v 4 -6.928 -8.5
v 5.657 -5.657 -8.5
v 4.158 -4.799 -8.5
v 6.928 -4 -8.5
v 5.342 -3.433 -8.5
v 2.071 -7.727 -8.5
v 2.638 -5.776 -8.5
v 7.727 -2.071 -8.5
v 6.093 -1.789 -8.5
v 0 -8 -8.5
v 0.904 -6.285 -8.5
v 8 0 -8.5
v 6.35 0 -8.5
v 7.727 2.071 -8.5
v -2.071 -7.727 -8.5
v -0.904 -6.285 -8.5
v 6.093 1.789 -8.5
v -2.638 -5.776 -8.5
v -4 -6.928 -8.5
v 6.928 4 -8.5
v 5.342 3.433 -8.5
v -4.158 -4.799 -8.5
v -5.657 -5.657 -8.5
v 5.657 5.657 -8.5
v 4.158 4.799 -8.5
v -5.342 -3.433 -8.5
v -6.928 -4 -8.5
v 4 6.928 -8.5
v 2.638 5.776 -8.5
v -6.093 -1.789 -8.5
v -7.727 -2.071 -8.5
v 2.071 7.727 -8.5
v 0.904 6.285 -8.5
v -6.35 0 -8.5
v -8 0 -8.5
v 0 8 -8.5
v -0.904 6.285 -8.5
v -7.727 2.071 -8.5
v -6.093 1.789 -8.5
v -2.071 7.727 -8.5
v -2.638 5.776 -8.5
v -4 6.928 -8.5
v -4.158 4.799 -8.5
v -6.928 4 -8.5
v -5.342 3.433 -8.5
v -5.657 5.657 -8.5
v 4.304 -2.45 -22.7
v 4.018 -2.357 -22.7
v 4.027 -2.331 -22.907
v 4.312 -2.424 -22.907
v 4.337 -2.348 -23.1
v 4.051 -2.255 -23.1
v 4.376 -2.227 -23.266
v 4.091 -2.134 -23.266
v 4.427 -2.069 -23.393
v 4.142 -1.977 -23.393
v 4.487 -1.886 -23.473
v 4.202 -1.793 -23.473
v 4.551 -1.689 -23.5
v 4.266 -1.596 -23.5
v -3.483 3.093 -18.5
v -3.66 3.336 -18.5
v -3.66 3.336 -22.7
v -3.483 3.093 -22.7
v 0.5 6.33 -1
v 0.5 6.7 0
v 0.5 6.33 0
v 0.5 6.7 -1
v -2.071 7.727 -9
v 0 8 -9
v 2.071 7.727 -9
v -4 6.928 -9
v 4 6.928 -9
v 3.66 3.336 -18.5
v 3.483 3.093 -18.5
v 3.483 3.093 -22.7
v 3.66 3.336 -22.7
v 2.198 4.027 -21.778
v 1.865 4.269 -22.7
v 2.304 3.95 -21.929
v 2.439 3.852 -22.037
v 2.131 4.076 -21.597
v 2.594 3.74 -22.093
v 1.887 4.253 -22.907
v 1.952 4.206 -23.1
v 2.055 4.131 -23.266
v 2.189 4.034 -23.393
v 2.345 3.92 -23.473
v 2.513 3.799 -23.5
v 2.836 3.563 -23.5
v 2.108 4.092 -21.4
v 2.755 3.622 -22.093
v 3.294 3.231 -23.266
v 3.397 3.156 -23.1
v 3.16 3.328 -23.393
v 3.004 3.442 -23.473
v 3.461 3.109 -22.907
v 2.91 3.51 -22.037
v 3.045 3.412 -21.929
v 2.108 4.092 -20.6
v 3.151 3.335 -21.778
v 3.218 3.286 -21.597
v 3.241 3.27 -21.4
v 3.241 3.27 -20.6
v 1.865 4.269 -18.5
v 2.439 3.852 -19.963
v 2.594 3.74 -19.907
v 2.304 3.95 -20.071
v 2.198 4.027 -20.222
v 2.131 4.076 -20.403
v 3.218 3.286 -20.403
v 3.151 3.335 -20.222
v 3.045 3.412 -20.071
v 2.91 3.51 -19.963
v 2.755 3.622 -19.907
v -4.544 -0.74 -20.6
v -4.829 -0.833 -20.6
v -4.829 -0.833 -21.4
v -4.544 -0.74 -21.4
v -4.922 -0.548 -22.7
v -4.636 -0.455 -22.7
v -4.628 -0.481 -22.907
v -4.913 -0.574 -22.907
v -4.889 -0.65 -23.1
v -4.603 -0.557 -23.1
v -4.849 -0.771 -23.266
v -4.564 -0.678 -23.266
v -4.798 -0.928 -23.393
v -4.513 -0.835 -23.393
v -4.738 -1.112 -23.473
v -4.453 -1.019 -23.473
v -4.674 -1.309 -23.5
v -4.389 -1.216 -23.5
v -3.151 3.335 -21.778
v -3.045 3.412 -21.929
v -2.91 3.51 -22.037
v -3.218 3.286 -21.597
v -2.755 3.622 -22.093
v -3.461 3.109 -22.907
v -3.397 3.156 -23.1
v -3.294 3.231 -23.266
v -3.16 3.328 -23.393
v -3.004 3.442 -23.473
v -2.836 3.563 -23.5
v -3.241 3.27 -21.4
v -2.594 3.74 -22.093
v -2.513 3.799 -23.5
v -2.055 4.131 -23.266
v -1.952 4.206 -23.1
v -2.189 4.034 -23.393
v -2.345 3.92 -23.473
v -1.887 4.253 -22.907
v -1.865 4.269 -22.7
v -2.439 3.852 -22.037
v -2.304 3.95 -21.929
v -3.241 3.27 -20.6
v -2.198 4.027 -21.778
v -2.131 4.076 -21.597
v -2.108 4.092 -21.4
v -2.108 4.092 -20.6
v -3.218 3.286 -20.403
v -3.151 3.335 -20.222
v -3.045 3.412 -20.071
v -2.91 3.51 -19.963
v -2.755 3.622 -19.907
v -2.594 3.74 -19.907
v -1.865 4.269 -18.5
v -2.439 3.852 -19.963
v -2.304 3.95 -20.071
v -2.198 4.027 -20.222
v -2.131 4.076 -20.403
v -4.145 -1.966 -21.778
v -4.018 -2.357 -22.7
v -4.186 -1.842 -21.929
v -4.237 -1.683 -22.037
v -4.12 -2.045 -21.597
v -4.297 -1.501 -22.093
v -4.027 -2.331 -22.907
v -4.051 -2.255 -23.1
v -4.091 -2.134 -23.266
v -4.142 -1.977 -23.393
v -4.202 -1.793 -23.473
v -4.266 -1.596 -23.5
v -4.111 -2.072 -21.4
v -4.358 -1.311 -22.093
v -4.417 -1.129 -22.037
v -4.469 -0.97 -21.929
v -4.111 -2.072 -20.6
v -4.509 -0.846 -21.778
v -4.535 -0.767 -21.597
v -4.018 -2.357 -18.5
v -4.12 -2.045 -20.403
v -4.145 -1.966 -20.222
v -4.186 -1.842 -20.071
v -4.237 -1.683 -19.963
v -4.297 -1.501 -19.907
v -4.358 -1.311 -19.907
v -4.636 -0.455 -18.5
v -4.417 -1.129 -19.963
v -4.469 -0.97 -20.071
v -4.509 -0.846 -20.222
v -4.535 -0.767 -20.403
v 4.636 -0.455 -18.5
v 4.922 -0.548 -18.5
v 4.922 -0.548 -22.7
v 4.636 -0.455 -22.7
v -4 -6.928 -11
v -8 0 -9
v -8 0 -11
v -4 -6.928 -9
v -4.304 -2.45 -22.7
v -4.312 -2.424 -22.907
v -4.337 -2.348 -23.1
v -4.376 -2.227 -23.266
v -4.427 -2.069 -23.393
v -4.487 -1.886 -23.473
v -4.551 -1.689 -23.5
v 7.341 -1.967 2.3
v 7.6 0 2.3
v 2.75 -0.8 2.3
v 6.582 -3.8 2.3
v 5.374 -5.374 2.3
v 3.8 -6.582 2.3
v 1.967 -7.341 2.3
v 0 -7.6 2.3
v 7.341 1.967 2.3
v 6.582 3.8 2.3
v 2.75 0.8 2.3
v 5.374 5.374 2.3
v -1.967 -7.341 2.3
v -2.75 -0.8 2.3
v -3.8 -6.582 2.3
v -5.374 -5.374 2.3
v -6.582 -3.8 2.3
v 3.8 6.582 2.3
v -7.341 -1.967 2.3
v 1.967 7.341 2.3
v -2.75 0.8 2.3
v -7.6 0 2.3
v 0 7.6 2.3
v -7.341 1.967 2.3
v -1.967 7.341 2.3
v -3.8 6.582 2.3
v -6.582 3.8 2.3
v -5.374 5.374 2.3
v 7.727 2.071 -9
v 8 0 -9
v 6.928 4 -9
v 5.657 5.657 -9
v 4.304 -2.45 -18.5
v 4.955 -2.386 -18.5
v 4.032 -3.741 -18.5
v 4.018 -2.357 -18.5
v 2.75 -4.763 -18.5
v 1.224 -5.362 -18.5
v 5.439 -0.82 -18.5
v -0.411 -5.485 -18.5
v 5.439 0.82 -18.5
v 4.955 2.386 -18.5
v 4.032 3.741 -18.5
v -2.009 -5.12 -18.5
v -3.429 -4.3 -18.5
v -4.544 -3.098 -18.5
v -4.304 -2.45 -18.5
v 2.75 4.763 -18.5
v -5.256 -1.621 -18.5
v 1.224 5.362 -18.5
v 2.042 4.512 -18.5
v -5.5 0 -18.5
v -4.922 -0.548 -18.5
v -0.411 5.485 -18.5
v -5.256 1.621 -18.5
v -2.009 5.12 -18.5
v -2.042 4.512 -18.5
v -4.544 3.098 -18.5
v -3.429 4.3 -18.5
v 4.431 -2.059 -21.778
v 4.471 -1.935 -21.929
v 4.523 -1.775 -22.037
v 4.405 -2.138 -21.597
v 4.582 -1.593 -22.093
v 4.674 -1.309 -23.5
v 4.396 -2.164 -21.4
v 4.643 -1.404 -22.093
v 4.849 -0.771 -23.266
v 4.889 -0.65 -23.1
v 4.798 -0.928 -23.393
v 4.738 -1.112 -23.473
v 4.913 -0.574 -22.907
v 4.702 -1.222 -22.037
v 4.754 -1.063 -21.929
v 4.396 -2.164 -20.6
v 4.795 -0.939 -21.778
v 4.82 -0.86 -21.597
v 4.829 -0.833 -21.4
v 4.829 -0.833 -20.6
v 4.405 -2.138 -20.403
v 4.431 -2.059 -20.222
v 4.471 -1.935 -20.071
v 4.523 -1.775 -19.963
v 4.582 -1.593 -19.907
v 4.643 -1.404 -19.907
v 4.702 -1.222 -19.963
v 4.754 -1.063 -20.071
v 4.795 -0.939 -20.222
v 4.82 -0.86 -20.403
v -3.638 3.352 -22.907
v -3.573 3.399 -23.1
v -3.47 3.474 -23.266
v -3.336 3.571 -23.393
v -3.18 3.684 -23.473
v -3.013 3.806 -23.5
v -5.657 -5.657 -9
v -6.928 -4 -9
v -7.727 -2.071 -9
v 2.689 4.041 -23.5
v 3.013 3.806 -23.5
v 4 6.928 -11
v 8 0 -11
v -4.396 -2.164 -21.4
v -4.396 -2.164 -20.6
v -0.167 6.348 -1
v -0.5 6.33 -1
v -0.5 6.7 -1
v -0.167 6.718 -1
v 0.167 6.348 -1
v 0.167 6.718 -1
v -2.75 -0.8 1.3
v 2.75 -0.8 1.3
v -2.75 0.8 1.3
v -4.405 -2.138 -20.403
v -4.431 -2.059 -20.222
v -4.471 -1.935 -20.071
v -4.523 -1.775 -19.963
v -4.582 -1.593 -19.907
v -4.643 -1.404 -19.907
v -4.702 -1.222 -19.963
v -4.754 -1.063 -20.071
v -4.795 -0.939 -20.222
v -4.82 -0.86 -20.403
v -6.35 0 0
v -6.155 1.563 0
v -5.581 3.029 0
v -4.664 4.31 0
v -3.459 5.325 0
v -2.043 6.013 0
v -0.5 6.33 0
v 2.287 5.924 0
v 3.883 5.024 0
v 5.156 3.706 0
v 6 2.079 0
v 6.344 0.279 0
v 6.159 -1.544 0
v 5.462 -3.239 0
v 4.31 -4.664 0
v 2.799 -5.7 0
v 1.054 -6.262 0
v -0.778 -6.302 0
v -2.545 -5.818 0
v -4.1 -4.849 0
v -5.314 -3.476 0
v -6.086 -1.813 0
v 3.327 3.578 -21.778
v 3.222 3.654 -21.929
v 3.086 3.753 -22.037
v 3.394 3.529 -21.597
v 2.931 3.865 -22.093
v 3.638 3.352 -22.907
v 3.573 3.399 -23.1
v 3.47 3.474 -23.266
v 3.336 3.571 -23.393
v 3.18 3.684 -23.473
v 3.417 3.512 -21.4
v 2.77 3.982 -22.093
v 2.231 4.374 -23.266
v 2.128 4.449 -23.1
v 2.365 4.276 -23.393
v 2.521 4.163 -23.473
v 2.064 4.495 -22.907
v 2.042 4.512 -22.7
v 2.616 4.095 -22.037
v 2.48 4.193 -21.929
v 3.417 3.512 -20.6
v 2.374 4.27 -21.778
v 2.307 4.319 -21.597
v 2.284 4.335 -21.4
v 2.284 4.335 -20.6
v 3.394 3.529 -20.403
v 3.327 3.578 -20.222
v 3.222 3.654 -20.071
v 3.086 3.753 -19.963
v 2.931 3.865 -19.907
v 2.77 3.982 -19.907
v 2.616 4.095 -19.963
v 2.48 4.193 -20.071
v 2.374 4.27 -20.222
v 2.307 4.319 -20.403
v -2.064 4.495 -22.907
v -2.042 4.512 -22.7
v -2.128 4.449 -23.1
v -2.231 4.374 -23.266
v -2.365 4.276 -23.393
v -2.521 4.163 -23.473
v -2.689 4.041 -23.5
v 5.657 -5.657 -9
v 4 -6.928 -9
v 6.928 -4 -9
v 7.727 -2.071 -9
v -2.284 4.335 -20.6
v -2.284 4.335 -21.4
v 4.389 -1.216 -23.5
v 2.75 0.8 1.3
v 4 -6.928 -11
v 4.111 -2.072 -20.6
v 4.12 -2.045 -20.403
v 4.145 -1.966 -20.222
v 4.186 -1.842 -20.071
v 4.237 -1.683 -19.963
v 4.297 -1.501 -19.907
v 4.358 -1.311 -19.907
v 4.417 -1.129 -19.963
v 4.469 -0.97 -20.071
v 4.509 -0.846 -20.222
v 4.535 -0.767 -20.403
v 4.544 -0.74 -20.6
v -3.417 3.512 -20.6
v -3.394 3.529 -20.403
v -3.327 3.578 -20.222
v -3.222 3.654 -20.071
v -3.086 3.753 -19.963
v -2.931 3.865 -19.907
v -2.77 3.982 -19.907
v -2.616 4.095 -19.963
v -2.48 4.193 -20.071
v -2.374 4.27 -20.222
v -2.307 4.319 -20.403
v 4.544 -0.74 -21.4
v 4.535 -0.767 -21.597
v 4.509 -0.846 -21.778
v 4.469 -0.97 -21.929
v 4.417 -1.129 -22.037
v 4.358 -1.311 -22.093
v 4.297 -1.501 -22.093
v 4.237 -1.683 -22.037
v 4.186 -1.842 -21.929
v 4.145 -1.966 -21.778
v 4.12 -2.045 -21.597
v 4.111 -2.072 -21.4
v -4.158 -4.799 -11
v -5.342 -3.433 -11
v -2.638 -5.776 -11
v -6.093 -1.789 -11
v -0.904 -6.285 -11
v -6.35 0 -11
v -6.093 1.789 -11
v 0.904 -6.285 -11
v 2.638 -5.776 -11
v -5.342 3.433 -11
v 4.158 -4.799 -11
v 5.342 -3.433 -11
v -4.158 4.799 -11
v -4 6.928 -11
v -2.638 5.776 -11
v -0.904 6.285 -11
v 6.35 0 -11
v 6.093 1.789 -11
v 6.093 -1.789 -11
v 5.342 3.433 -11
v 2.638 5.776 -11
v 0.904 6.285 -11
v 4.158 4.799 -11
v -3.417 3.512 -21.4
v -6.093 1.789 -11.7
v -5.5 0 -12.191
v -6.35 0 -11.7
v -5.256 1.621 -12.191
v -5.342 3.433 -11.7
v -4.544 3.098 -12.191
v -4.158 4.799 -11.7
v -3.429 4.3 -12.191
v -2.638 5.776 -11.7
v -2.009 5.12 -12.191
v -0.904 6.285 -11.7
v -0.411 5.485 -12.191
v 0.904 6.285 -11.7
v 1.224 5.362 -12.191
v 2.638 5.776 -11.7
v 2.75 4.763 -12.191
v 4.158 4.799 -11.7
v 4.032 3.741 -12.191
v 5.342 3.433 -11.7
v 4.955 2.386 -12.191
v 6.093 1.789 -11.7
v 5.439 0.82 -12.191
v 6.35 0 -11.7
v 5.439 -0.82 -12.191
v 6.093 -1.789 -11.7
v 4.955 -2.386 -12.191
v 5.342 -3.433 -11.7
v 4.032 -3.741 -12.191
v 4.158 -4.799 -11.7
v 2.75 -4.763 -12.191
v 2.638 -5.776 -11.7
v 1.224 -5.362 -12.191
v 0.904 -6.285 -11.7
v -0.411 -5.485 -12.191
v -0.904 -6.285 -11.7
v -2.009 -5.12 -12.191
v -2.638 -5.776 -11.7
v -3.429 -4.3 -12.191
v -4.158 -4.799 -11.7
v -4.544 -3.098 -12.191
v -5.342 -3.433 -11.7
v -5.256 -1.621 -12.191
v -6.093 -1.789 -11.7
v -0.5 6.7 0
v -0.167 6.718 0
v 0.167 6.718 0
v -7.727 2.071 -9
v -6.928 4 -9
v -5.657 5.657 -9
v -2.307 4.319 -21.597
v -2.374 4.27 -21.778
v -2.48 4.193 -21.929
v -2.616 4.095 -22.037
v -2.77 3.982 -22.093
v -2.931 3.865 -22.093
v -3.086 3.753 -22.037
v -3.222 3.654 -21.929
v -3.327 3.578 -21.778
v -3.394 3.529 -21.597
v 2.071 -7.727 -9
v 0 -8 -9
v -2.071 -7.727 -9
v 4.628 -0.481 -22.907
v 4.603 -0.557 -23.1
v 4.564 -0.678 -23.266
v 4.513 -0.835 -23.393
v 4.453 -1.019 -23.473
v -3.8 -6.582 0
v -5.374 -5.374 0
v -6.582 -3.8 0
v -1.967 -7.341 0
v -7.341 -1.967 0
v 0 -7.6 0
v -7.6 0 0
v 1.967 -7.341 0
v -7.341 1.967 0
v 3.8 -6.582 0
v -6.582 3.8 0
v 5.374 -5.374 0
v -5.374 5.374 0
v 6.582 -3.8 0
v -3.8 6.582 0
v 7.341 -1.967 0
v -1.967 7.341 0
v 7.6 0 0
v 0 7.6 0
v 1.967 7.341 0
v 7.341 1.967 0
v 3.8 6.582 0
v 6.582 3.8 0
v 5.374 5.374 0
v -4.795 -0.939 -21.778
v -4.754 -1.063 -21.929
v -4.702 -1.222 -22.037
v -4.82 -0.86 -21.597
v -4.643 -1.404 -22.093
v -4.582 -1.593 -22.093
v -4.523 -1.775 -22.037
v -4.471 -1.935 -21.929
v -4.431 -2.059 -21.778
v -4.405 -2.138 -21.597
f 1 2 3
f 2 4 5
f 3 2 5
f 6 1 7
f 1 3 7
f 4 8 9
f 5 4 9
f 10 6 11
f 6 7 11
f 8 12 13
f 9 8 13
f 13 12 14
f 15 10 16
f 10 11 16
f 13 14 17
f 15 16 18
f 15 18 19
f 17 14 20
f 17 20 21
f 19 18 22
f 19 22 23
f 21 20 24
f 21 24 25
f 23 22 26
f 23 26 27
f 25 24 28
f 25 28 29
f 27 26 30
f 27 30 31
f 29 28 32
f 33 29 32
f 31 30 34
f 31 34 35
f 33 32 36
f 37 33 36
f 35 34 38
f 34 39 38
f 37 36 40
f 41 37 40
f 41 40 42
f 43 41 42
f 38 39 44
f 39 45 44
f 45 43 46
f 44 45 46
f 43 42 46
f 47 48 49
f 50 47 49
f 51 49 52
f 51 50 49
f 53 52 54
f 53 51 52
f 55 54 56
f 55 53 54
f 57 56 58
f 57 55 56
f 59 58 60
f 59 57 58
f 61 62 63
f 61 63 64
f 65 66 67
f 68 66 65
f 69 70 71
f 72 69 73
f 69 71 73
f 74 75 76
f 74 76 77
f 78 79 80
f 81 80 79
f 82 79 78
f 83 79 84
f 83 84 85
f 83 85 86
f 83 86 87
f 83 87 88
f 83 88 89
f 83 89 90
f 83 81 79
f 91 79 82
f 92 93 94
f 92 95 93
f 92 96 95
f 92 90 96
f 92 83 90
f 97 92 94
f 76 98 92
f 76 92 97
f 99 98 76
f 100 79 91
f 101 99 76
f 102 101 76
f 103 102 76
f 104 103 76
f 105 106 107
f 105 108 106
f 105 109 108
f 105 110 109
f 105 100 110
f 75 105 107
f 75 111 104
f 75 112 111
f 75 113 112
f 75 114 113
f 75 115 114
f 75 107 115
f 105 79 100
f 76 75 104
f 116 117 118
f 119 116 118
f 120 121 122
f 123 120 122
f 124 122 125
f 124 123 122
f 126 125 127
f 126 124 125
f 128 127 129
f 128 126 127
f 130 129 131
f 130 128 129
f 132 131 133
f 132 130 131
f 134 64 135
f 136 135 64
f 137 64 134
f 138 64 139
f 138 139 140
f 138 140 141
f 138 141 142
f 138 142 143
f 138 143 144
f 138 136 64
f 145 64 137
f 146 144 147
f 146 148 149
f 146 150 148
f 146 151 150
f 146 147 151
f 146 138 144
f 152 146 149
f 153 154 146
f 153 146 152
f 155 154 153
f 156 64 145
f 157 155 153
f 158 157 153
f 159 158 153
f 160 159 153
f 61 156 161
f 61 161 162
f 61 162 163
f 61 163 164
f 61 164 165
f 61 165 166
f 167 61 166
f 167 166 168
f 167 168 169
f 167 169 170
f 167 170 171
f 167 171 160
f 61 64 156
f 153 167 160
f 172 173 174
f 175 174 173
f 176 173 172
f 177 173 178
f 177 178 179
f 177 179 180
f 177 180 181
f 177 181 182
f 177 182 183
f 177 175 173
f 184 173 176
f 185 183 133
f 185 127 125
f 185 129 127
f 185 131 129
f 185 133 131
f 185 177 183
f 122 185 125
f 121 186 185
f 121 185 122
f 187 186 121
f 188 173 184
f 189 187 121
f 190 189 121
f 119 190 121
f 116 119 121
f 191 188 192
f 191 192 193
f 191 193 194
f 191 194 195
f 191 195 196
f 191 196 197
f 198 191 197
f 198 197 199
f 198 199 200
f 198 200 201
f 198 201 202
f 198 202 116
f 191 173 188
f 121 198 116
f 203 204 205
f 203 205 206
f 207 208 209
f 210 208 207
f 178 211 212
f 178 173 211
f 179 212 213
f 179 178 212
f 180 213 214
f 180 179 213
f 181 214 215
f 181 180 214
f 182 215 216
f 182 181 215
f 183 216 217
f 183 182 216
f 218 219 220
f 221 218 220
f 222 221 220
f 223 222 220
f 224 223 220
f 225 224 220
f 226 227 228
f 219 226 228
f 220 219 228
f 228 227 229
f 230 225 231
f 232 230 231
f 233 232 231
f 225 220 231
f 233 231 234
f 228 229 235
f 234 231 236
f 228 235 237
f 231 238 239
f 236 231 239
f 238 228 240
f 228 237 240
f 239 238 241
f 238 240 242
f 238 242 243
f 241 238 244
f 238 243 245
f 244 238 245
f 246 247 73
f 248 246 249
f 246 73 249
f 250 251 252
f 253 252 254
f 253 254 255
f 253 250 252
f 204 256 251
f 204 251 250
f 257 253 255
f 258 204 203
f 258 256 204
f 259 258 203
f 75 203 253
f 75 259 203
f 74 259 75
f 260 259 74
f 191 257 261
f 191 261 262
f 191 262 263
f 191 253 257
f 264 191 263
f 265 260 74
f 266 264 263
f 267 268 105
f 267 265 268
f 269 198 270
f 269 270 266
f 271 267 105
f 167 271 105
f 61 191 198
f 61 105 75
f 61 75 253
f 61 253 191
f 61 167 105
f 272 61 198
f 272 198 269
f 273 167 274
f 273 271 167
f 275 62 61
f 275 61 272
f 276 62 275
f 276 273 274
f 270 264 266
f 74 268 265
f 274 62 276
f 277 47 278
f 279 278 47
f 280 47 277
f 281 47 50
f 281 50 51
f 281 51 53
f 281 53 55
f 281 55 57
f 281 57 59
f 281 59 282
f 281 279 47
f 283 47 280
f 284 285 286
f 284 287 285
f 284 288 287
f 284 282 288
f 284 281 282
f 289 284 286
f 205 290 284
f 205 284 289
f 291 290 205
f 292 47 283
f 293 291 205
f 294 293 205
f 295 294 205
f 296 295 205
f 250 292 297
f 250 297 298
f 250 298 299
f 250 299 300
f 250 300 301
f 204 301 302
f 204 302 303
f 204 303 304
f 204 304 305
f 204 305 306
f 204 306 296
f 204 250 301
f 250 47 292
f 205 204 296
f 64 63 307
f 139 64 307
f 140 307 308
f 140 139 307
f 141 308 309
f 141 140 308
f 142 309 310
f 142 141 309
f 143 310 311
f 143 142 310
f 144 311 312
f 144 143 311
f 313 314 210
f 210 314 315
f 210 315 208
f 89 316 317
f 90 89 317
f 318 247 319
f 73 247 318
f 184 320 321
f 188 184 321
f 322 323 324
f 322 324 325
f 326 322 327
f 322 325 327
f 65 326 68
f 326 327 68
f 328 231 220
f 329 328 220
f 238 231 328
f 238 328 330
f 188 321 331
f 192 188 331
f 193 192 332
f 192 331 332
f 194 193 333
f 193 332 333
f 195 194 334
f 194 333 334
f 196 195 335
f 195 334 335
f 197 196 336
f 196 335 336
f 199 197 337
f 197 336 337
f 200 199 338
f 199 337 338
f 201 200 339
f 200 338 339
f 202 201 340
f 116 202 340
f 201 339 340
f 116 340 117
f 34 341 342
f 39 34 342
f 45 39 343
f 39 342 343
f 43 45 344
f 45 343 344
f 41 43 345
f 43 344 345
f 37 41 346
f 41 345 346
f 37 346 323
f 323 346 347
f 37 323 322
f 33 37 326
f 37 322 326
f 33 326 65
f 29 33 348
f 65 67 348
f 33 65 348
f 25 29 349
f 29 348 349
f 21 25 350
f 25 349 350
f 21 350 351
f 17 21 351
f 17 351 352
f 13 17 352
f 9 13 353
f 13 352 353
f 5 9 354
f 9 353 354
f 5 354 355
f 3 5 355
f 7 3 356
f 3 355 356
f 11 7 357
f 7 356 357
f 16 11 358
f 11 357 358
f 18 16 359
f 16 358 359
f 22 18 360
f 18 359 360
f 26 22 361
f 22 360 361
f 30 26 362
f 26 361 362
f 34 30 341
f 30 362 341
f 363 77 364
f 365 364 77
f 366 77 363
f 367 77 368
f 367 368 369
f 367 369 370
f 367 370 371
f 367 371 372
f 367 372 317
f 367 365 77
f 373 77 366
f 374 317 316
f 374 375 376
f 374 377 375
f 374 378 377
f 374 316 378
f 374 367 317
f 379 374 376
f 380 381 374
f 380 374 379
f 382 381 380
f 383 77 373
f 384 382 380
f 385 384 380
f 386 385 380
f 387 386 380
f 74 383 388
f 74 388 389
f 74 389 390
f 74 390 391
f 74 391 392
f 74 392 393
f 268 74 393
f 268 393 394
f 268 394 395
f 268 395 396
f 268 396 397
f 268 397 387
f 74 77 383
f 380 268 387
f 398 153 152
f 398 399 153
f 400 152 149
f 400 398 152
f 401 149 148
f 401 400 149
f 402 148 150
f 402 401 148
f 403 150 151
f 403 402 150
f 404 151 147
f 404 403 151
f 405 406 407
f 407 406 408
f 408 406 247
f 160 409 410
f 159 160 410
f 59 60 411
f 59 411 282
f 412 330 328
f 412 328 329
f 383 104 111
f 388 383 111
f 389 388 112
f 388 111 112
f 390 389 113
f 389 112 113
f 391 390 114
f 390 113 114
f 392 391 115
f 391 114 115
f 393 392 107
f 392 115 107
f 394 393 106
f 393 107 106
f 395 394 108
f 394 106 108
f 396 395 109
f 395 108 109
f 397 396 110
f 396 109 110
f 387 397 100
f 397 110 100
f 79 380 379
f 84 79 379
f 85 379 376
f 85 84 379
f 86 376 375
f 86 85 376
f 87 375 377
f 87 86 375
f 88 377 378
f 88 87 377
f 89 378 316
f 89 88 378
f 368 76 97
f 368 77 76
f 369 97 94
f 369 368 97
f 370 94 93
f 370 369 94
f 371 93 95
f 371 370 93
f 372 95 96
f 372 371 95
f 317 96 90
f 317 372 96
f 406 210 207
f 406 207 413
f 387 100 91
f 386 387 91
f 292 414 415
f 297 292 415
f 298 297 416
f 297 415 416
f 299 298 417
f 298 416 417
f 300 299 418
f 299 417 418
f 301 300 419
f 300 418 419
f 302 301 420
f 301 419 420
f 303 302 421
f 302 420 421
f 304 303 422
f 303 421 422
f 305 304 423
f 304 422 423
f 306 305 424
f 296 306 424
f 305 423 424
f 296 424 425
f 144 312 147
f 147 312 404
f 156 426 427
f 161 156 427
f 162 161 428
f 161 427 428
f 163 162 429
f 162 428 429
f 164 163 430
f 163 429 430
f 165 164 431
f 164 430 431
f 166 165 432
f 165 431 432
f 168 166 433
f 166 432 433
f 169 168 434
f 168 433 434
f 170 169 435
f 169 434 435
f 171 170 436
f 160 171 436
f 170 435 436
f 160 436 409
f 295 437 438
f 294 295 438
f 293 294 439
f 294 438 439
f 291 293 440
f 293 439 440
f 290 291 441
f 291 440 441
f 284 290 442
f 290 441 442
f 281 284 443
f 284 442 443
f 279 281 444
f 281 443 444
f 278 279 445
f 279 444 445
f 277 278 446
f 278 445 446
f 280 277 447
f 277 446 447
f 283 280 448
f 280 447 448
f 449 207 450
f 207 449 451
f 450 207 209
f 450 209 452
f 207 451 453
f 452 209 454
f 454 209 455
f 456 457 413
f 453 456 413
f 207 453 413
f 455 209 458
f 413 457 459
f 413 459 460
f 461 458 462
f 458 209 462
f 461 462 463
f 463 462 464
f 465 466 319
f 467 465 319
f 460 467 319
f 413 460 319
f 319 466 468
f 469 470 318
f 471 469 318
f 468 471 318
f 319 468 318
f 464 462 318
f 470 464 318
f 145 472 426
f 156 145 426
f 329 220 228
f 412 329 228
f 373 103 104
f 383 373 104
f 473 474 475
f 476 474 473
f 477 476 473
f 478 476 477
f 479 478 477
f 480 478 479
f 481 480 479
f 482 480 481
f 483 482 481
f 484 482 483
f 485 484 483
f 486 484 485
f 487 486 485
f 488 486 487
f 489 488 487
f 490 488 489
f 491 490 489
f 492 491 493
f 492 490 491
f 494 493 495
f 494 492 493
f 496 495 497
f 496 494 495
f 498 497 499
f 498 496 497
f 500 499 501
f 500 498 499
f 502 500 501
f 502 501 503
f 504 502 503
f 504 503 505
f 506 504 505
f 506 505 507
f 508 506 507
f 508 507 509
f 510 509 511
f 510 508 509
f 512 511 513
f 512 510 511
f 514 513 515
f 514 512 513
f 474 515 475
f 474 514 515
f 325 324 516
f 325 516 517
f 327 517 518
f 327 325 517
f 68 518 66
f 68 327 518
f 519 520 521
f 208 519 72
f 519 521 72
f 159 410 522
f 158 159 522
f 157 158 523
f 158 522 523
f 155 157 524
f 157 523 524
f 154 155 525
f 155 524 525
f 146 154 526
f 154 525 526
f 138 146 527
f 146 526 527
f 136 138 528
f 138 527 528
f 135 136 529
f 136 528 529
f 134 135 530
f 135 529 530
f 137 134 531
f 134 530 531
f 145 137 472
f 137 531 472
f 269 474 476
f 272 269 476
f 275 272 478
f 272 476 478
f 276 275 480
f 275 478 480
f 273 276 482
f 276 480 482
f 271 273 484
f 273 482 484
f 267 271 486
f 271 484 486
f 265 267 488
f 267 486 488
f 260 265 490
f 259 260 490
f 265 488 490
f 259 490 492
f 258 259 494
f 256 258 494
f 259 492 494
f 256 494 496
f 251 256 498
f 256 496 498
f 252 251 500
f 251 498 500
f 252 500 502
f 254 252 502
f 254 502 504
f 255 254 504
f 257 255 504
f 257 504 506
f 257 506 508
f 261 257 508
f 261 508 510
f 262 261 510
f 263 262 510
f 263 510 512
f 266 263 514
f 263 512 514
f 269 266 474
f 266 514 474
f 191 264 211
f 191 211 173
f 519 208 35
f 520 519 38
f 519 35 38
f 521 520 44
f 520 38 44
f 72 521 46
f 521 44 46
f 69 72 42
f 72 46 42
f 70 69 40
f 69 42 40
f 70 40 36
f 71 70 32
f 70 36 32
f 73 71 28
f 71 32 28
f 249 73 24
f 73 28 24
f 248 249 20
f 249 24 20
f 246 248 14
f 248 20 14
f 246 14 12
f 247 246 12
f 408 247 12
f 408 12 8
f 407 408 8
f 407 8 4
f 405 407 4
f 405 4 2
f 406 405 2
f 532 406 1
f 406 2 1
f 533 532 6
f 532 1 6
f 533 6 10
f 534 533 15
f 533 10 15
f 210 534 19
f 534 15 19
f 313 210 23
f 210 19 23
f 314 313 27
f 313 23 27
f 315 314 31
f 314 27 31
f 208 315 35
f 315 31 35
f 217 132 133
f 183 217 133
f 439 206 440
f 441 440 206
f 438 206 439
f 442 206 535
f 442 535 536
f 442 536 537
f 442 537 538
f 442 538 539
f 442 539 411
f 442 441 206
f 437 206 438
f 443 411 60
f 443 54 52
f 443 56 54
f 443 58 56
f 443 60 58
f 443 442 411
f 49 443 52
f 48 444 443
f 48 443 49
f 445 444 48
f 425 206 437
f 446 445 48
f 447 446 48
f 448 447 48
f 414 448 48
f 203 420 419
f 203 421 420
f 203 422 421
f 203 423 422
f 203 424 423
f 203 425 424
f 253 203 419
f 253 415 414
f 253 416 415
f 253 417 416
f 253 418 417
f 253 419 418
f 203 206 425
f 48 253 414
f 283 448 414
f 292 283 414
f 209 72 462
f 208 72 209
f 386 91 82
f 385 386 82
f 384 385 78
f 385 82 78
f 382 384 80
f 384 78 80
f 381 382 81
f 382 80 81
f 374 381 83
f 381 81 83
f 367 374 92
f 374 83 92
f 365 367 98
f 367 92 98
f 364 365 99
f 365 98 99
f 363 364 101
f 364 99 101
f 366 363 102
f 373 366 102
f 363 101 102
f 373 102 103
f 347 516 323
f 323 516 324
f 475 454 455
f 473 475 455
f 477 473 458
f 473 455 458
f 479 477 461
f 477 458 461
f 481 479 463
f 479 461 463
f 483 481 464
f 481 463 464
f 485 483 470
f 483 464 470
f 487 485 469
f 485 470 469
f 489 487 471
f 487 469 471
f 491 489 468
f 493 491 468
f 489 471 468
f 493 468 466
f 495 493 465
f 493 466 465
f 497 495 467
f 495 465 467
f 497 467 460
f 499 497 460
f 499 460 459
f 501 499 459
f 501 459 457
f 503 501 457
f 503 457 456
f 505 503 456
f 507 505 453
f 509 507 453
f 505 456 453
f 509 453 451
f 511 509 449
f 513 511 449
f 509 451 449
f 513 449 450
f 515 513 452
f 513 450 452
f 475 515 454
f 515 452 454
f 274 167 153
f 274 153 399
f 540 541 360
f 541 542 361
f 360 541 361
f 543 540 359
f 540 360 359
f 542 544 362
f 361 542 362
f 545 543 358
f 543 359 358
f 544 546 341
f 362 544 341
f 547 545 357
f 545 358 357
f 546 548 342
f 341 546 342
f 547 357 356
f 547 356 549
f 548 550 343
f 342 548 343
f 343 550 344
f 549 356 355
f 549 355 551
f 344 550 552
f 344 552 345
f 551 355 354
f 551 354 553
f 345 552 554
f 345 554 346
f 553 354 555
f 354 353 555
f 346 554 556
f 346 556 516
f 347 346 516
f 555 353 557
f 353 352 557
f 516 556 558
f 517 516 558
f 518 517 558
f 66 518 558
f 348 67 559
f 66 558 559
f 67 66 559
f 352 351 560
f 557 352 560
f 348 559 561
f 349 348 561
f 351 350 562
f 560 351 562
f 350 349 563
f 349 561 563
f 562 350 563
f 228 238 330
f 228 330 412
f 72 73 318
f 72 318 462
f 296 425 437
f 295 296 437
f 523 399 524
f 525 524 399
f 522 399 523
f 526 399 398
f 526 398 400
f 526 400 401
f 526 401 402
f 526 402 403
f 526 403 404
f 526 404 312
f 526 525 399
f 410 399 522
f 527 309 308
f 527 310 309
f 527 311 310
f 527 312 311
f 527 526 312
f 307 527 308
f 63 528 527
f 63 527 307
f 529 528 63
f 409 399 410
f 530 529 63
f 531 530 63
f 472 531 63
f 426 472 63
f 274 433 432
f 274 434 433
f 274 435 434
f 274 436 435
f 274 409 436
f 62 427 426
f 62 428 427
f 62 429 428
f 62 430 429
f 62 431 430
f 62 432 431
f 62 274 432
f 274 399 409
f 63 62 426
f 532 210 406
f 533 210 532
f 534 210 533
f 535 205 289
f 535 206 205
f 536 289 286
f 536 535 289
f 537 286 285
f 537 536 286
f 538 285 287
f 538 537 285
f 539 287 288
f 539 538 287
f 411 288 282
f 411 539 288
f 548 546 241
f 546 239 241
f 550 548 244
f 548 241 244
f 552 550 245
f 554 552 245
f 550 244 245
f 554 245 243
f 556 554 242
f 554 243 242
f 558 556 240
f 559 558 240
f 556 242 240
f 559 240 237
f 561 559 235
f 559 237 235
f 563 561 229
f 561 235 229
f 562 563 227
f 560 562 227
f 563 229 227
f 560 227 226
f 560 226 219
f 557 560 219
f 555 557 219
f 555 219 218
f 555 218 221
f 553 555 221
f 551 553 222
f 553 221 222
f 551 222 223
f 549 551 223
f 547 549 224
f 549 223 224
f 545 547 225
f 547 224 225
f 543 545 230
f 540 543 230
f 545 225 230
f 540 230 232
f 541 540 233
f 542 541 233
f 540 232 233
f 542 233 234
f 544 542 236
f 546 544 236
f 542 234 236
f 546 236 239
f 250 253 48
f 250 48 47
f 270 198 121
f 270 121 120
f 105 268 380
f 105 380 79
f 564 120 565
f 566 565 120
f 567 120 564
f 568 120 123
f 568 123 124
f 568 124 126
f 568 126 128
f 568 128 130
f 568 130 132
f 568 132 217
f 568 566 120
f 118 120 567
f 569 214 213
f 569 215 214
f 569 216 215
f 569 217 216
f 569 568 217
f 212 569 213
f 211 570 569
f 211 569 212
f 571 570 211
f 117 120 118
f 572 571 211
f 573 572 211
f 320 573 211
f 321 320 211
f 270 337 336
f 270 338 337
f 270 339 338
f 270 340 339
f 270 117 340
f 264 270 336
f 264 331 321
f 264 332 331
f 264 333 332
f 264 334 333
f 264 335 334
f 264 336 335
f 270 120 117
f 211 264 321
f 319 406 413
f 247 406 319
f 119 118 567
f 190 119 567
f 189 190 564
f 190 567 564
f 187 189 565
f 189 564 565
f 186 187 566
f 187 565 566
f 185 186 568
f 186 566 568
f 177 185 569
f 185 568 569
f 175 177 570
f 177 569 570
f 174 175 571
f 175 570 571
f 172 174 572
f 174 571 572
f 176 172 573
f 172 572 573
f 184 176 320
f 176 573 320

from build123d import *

# Parameters (mm, degrees)
BOSS_EXTRUDE1_DEPTH        = 2
SKETCH3_R                  = 6.35
BOSS_EXTRUDE2_DEPTH        = 0.7
SKETCH4_R                  = 6.35
BOSS_EXTRUDE3_DEPTH        = 0.490747729
BOSS_EXTRUDE3_TAPER        = 60.000000001
SKETCH5_R                  = 5.5
BOSS_EXTRUDE4_DEPTH        = 6.309252271
BOSS_EXTRUDE5_DEPTH        = 5
CUT_EXTRUDE1_DEPTH         = 29.154677259
BOSS_EXTRUDE6_DEPTH        = 5
CUT_EXTRUDE2_DEPTH         = 29.330896625
BOSS_EXTRUDE7_DEPTH        = 5
CUT_EXTRUDE3_DEPTH         = 29.311732629
BOSS_EXTRUDE8_DEPTH        = 5
CUT_EXTRUDE4_DEPTH         = 29.498497405
BOSS_EXTRUDE9_REACH        = 28.981
BOSS_EXTRUDE9_START_RADIUS = 6.35
BOSS_EXTRUDE9_END_RADIUS   = 6.35
SKETCH14_W                 = 1
SKETCH14_H                 = 1
FILLET1_R                  = 0.8
SKETCH15_W                 = 5.5
SKETCH15_H                 = 1.6
CUT_EXTRUDE5_DEPTH         = 1


with BuildPart() as part:
    # Sketch1 → Revolve1 (revolve)
    with BuildSketch(Plane.XZ, mode=Mode.PRIVATE) as revolve1_sk:
        Polygon((7.6, 2.3), (0, 2.3), (0, -9), (8, -9), (8, -8.5), (6.35, -8.5), (6.35, 0), (7.6, 0), align=None)
    revolve(revolve1_sk.sketch.rotate(Axis((0, 0, 2.3), (0, 0, -1)), 180), axis=Axis((0, 0, 2.3), (0, 0, -1)))

    # Sketch2 → Boss-Extrude1 (add)
    with BuildSketch(Plane(origin=(0, 0, -9), x_dir=(-1, 0, 0), z_dir=(0, 0, -1))):
        Polygon((-4, -6.92820323), (-8, 0), (-4, 6.92820323), (4, 6.92820323), (8, 0), (4, -6.92820323), align=None)
    extrude(amount=BOSS_EXTRUDE1_DEPTH)

    # Sketch3 → Boss-Extrude2 (add)
    with BuildSketch(Plane(origin=(0, 0, -11), x_dir=(-1, 0, 0), z_dir=(0, 0, -1))):
        Circle(SKETCH3_R)
    extrude(amount=BOSS_EXTRUDE2_DEPTH)

    # Sketch4 → Boss-Extrude3 (add)
    with BuildSketch(Plane(origin=(0, 0, -11.7), x_dir=(-1, 0, 0), z_dir=(0, 0, -1))):
        Circle(SKETCH4_R)
    extrude(amount=BOSS_EXTRUDE3_DEPTH, taper=BOSS_EXTRUDE3_TAPER)

    # Sketch5 → Boss-Extrude4 (add)
    with BuildSketch(Plane(origin=(0, 0, -12.190747729), x_dir=(-1, 0, 0), z_dir=(0, 0, -1))):
        Circle(SKETCH5_R)
    extrude(amount=BOSS_EXTRUDE4_DEPTH)

    # Sketch6 → Boss-Extrude5 (add)
    with BuildSketch(Plane(origin=(0, 0, -18.5), x_dir=(-1, 0, 0), z_dir=(0, 0, -1))):
        Polygon((-4.921641098, -0.547675906), (-4.636324144, -0.454970808), (-4.018290155, -2.357083841), (-4.30360711, -2.449788939), align=None)
    extrude(amount=BOSS_EXTRUDE5_DEPTH)

    # Sketch7 → Cut-Extrude1 (cut, through all)
    with BuildSketch(Plane(origin=(4.327307149, -1.406027324, 0), x_dir=(0, 0, 1), z_dir=(-0.9510565162951721, 0.30901699437489094, 0))):
        with BuildLine():
            Line((-21.4, -0.7), (-20.6, -0.7))
            ThreePointArc((-20.6, -0.7), (-19.9, 0), (-20.6, 0.7))
            Line((-20.6, 0.7), (-21.4, 0.7))
            ThreePointArc((-21.4, 0.7), (-22.1, 0), (-21.4, -0.7))
        make_face()
    extrude(amount=-CUT_EXTRUDE1_DEPTH, mode=Mode.SUBTRACT)

    # Sketch8 → Boss-Extrude6 (add)
    with BuildSketch(Plane(origin=(0, 0, -18.5), x_dir=(-1, 0, 0), z_dir=(0, 0, -1))):
        Polygon((-3.483439892, 3.093242072), (-3.659775468, 3.33594717), (-2.041741479, 4.511517675), (-1.865405904, 4.268812577), align=None)
    extrude(amount=BOSS_EXTRUDE6_DEPTH)

    # Sketch9 → Cut-Extrude2 (cut, through all)
    with BuildSketch(Plane(origin=(2.674422898, 3.681027324, 0), x_dir=(0.8090169943747798, -0.5877852522927041, 0), z_dir=(-0.587785252292704, -0.8090169943747797, 0))):
        with BuildLine():
            Line((0.7, -21.4), (0.7, -20.6))
            ThreePointArc((0.7, -20.6), (0, -19.9), (-0.7, -20.6))
            Line((-0.7, -20.6), (-0.7, -21.4))
            ThreePointArc((-0.7, -21.4), (0, -22.1), (0.7, -21.4))
        make_face()
    extrude(amount=-CUT_EXTRUDE2_DEPTH, mode=Mode.SUBTRACT)

    # Sketch10 → Boss-Extrude7 (add)
    with BuildSketch(Plane(origin=(0, 0, -18.5), x_dir=(-1, 0, 0), z_dir=(0, 0, -1))):
        Polygon((4.636324144, -0.454970808), (4.921641098, -0.547675906), (4.30360711, -2.449788939), (4.018290155, -2.357083841), align=None)
    extrude(amount=BOSS_EXTRUDE7_DEPTH)

    # Sketch11 → Cut-Extrude3 (cut, through all)
    with BuildSketch(Plane(origin=(-4.612624104, -1.498732423, 0), x_dir=(0, 0, 1), z_dir=(-0.9510565162951283, -0.3090169943750252, 0))):
        with BuildLine():
            Line((-20.6, 0.7), (-21.4, 0.7))
            ThreePointArc((-21.4, 0.7), (-22.1, 0), (-21.4, -0.7))
            Line((-21.4, -0.7), (-20.6, -0.7))
            ThreePointArc((-20.6, -0.7), (-19.9, 0), (-20.6, 0.7))
        make_face()
    extrude(amount=-CUT_EXTRUDE3_DEPTH, mode=Mode.SUBTRACT)

    # Sketch12 → Boss-Extrude8 (add)
    with BuildSketch(Plane(origin=(0, 0, -18.5), x_dir=(-1, 0, 0), z_dir=(0, 0, -1))):
        Polygon((1.865405904, 4.268812577), (2.041741479, 4.511517675), (3.659775468, 3.33594717), (3.483439892, 3.093242072), align=None)
    extrude(amount=BOSS_EXTRUDE8_DEPTH)

    # Sketch13 → Cut-Extrude4 (cut, through all)
    with BuildSketch(Plane(origin=(-2.850758474, 3.923732423, 0), x_dir=(-0.8090169943749189, -0.5877852522925126, 0), z_dir=(-0.5877852522925126, 0.8090169943749189, 0))):
        with BuildLine():
            Line((-0.7, -20.6), (-0.7, -21.4))
            ThreePointArc((-0.7, -21.4), (0, -22.1), (0.7, -21.4))
            Line((0.7, -21.4), (0.7, -20.6))
            ThreePointArc((0.7, -20.6), (0, -19.9), (-0.7, -20.6))
        make_face()
    extrude(amount=-CUT_EXTRUDE4_DEPTH, mode=Mode.SUBTRACT)

    # Boss-Extrude9: from a cylinder face, 28.981 long prism both ways, kept between that surface and its translate by the depth
    boss_extrude9_start = Plane(origin=(0, 0, -0.5), z_dir=(0, 0, -1)) * Cylinder(BOSS_EXTRUDE9_START_RADIUS, 71.662, mode=Mode.PRIVATE)
    boss_extrude9_end = Plane(origin=(0, 0.369715646, -0.5), z_dir=(0, 0, -1)) * Cylinder(BOSS_EXTRUDE9_END_RADIUS, 71.662, mode=Mode.PRIVATE)
    # Sketch14 → Boss-Extrude9 (add, from a surface)
    with BuildSketch(Plane(origin=(0, -1.5875, 0), x_dir=(1, 0, 0), z_dir=(0, 1, 0)), mode=Mode.PRIVATE) as boss_extrude9_sk1:
        with Locations((0, 0.5)):
            Rectangle(SKETCH14_W, SKETCH14_H)
    boss_extrude9_tool1 = extrude(boss_extrude9_sk1.sketch, amount=BOSS_EXTRUDE9_REACH, both=True, mode=Mode.PRIVATE)
    add(((boss_extrude9_tool1 - boss_extrude9_start) & boss_extrude9_end).solids().sort_by_distance((0, 6.515142, -0.5))[0])

    # Fillet1
    fillet1_edges = [part.edges().sort_by_distance(p)[0] for p in [
        (-4.160948632, -2.40343639, -23.5),
        (-4.778982621, -0.501323357, -23.5),
        (-3.57160768, 3.214594621, -23.5),
        (-1.953573691, 4.390165126, -23.5),
        (4.160948632, -2.40343639, -23.5),
        (4.778982621, -0.501323357, -23.5),
        (1.953573691, 4.390165126, -23.5),
        (3.57160768, 3.214594621, -23.5),
    ]]
    fillet(fillet1_edges, radius=FILLET1_R)

    # Sketch15 → Cut-Extrude5 (cut)
    with BuildSketch(Plane.XY.offset(2.3)):
        Rectangle(SKETCH15_W, SKETCH15_H)
    extrude(amount=-CUT_EXTRUDE5_DEPTH, mode=Mode.SUBTRACT)


solid = part.part
